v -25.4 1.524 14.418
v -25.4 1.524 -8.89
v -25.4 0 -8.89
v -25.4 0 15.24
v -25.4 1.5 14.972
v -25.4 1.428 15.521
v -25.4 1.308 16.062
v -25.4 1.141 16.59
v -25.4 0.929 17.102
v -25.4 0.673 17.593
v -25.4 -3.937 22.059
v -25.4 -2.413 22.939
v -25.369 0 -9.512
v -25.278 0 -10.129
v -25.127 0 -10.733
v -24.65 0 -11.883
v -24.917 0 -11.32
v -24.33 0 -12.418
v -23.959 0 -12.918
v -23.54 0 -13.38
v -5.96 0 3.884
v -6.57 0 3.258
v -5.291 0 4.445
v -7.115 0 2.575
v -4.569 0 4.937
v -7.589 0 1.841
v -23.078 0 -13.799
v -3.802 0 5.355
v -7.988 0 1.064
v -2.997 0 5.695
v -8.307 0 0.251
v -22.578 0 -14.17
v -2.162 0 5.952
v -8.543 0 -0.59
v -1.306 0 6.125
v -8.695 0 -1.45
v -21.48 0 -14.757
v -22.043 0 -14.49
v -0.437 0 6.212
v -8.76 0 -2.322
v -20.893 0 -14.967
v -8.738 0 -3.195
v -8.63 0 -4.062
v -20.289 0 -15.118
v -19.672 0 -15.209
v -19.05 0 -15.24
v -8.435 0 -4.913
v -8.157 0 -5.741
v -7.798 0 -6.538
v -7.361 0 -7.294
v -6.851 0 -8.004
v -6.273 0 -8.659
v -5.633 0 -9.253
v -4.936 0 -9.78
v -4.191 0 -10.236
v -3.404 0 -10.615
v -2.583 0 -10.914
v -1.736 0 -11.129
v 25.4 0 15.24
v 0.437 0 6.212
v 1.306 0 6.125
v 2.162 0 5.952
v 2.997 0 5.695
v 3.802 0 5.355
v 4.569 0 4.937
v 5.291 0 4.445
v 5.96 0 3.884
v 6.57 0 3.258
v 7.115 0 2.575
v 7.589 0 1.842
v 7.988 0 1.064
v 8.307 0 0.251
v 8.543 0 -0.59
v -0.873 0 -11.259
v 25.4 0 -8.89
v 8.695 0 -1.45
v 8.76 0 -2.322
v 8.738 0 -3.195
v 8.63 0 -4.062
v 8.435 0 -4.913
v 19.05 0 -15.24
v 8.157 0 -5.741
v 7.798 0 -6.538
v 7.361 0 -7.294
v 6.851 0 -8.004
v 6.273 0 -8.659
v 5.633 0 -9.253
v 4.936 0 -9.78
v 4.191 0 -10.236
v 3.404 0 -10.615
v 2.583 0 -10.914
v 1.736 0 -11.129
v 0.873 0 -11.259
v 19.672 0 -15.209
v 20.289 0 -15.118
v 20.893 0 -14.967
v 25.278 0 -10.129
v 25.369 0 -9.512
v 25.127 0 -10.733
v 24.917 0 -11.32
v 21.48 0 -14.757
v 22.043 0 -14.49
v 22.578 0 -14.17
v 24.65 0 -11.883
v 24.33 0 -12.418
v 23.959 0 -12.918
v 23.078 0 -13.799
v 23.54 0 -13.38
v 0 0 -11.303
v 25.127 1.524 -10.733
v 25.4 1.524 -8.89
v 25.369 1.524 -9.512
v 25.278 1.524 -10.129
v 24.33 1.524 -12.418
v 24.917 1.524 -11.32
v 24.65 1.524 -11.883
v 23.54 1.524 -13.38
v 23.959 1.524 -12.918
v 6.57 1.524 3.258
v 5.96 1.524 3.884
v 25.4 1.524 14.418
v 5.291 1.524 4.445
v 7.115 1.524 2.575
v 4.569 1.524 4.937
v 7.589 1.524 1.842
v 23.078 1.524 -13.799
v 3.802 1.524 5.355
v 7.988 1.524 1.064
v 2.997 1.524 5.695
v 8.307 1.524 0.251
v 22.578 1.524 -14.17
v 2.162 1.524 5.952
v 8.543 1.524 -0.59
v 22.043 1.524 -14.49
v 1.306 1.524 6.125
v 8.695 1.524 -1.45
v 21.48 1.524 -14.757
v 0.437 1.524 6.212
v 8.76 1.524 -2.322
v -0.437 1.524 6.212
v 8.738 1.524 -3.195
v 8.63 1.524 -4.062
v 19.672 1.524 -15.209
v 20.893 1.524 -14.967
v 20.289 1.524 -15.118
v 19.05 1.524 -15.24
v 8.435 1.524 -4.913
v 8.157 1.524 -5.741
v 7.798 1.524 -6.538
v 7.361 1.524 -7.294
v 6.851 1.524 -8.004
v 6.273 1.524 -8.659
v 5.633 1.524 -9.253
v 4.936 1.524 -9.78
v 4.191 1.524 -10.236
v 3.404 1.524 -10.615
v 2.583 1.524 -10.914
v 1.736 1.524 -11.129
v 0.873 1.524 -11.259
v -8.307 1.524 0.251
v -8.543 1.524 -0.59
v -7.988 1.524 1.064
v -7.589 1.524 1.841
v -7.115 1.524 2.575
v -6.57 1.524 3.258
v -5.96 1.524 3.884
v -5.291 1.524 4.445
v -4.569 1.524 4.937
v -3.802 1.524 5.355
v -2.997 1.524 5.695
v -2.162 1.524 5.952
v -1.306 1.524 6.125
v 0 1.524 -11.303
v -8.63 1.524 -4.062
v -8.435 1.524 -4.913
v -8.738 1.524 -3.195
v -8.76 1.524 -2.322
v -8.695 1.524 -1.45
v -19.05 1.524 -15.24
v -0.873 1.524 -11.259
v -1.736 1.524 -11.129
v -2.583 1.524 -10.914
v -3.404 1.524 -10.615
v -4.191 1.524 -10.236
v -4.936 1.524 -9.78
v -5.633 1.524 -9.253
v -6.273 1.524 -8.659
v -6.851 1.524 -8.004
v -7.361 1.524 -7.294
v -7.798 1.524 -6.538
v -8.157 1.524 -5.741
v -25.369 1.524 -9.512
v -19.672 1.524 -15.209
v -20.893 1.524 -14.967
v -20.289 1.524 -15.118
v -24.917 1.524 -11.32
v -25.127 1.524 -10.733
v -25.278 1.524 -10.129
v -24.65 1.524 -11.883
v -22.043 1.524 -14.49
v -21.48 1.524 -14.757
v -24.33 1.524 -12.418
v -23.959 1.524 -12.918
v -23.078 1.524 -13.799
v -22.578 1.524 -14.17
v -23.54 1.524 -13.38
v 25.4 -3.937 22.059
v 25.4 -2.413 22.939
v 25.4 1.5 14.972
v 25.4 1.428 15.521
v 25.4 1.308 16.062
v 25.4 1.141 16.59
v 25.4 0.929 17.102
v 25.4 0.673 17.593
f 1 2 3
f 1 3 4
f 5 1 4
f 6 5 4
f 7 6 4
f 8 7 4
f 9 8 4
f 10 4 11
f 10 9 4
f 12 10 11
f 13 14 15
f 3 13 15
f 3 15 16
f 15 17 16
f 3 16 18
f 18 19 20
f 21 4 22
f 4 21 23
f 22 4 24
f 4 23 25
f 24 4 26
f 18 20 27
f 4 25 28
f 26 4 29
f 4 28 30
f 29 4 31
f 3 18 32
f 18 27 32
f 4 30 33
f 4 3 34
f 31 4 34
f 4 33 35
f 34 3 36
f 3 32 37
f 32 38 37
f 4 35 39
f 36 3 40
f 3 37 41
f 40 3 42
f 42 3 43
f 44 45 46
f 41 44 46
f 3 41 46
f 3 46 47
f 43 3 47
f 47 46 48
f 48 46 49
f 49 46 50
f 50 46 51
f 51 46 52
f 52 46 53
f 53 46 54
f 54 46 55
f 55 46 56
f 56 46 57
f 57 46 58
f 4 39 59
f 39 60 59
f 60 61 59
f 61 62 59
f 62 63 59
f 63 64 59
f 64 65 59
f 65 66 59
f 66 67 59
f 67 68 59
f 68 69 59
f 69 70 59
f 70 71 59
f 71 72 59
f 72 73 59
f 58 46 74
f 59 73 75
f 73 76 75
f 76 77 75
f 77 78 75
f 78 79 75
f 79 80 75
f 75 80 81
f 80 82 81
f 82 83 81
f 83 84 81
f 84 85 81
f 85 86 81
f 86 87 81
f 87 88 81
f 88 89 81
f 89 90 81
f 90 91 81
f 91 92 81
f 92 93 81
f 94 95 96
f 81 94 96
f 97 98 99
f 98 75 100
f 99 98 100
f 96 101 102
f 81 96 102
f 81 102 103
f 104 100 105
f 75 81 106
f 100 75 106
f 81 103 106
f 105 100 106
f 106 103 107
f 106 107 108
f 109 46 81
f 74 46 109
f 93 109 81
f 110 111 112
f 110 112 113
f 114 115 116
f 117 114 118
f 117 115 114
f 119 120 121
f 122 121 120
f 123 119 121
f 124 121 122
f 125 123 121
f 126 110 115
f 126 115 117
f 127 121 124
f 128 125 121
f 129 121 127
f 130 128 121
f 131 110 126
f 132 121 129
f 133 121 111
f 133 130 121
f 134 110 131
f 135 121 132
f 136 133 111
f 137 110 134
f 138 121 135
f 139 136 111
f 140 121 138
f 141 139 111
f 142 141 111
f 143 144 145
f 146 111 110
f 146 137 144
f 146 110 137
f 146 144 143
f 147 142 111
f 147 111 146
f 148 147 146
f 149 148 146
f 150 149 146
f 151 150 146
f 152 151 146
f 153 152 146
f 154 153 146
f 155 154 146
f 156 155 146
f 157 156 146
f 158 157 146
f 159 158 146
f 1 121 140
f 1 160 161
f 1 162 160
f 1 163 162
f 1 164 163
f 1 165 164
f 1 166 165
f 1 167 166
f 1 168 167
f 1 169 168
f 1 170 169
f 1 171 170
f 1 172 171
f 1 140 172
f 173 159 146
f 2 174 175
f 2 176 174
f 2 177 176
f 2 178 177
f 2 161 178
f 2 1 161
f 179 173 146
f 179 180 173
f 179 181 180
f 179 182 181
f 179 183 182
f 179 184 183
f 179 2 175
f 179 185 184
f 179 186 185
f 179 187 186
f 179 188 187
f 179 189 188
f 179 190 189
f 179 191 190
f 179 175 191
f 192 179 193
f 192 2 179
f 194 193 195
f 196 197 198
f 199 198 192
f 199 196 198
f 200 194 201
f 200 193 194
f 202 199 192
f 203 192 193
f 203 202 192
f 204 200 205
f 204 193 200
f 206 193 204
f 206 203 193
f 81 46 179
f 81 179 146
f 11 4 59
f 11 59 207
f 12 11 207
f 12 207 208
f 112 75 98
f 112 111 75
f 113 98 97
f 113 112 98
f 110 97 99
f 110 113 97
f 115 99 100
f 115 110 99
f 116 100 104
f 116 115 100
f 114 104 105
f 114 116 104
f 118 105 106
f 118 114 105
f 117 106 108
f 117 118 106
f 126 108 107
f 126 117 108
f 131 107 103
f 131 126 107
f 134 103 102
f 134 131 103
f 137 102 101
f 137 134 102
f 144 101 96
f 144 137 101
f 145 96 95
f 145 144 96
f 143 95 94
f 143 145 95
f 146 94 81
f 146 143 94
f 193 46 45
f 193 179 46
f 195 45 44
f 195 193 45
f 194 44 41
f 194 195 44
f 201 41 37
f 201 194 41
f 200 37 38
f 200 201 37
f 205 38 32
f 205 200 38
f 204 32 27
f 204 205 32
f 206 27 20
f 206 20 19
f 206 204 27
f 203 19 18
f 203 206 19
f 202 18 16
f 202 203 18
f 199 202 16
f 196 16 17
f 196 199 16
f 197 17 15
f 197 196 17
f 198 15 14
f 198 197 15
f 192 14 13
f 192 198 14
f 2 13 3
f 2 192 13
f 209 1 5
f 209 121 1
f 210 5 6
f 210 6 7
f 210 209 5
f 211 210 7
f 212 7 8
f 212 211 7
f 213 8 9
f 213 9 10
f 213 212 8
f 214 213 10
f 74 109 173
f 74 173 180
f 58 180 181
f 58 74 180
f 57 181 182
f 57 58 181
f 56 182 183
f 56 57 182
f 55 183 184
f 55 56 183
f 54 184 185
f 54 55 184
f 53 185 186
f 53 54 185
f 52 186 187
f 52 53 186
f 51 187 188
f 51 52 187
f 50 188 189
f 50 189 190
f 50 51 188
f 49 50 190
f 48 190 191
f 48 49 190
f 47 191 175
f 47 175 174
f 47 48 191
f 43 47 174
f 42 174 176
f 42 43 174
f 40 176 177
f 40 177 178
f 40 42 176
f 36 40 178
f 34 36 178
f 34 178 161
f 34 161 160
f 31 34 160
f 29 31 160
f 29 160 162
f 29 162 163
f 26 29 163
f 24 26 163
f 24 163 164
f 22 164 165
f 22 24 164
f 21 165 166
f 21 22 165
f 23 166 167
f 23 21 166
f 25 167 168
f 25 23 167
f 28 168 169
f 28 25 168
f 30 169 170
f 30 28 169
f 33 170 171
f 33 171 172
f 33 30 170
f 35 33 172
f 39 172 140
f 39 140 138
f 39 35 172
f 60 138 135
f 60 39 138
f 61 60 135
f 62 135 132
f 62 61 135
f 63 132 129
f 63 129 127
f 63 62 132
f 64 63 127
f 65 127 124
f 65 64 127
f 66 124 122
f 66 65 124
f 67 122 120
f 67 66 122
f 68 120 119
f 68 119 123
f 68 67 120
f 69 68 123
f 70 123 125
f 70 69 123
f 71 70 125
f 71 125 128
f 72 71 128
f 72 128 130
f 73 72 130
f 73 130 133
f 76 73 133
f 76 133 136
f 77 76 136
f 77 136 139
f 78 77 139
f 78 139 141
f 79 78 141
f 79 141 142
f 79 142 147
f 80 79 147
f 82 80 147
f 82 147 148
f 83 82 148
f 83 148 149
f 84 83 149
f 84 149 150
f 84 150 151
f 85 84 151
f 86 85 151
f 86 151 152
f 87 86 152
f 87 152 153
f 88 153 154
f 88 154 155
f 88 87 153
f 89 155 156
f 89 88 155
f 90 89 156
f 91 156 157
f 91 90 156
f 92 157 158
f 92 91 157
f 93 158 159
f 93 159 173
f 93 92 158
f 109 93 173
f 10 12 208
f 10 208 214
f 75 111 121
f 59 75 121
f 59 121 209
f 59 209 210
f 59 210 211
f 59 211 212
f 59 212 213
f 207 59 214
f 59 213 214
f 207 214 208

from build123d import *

# Parameters (mm, degrees)
SKETCH1_W           = 50.8
SKETCH1_H           = 30.48
SKETCH1_R           = 8.763
BOSS_EXTRUDE1_DEPTH = 1.524
BOSS_EXTRUDE2_DEPTH = 50.8
FILLET1_R           = 6.35


with BuildPart() as part:
    # Sketch1 → Boss-Extrude1 (new body)
    with BuildSketch(Plane(origin=(0, 0, 0), x_dir=(1, 0, 0), z_dir=(0, 1, 0))):
        Rectangle(SKETCH1_W, SKETCH1_H)
        with Locations(Location((0, 2.54, 0), (0, 0, 90))):
            Circle(SKETCH1_R, mode=Mode.SUBTRACT)
    extrude(amount=BOSS_EXTRUDE1_DEPTH)

    # Sketch2 → Boss-Extrude2 (add)
    with BuildSketch(Plane.ZY.offset(25.4)):
        Polygon((15.24, 0), (22.059084029, -3.937), (22.93896584, -2.413), (16.11988181, 1.524), (15.24, 1.524), align=None)
    extrude(amount=-BOSS_EXTRUDE2_DEPTH)

    # Fillet1
    fillet1_edges = [part.edges().sort_by_distance(p)[0] for p in [
        (0, 1.524, 16.11988181),
        (-25.4, 0.762, -15.24),
        (25.4, 0.762, -15.24),
    ]]
    fillet(fillet1_edges, radius=FILLET1_R)


solid = part.part
